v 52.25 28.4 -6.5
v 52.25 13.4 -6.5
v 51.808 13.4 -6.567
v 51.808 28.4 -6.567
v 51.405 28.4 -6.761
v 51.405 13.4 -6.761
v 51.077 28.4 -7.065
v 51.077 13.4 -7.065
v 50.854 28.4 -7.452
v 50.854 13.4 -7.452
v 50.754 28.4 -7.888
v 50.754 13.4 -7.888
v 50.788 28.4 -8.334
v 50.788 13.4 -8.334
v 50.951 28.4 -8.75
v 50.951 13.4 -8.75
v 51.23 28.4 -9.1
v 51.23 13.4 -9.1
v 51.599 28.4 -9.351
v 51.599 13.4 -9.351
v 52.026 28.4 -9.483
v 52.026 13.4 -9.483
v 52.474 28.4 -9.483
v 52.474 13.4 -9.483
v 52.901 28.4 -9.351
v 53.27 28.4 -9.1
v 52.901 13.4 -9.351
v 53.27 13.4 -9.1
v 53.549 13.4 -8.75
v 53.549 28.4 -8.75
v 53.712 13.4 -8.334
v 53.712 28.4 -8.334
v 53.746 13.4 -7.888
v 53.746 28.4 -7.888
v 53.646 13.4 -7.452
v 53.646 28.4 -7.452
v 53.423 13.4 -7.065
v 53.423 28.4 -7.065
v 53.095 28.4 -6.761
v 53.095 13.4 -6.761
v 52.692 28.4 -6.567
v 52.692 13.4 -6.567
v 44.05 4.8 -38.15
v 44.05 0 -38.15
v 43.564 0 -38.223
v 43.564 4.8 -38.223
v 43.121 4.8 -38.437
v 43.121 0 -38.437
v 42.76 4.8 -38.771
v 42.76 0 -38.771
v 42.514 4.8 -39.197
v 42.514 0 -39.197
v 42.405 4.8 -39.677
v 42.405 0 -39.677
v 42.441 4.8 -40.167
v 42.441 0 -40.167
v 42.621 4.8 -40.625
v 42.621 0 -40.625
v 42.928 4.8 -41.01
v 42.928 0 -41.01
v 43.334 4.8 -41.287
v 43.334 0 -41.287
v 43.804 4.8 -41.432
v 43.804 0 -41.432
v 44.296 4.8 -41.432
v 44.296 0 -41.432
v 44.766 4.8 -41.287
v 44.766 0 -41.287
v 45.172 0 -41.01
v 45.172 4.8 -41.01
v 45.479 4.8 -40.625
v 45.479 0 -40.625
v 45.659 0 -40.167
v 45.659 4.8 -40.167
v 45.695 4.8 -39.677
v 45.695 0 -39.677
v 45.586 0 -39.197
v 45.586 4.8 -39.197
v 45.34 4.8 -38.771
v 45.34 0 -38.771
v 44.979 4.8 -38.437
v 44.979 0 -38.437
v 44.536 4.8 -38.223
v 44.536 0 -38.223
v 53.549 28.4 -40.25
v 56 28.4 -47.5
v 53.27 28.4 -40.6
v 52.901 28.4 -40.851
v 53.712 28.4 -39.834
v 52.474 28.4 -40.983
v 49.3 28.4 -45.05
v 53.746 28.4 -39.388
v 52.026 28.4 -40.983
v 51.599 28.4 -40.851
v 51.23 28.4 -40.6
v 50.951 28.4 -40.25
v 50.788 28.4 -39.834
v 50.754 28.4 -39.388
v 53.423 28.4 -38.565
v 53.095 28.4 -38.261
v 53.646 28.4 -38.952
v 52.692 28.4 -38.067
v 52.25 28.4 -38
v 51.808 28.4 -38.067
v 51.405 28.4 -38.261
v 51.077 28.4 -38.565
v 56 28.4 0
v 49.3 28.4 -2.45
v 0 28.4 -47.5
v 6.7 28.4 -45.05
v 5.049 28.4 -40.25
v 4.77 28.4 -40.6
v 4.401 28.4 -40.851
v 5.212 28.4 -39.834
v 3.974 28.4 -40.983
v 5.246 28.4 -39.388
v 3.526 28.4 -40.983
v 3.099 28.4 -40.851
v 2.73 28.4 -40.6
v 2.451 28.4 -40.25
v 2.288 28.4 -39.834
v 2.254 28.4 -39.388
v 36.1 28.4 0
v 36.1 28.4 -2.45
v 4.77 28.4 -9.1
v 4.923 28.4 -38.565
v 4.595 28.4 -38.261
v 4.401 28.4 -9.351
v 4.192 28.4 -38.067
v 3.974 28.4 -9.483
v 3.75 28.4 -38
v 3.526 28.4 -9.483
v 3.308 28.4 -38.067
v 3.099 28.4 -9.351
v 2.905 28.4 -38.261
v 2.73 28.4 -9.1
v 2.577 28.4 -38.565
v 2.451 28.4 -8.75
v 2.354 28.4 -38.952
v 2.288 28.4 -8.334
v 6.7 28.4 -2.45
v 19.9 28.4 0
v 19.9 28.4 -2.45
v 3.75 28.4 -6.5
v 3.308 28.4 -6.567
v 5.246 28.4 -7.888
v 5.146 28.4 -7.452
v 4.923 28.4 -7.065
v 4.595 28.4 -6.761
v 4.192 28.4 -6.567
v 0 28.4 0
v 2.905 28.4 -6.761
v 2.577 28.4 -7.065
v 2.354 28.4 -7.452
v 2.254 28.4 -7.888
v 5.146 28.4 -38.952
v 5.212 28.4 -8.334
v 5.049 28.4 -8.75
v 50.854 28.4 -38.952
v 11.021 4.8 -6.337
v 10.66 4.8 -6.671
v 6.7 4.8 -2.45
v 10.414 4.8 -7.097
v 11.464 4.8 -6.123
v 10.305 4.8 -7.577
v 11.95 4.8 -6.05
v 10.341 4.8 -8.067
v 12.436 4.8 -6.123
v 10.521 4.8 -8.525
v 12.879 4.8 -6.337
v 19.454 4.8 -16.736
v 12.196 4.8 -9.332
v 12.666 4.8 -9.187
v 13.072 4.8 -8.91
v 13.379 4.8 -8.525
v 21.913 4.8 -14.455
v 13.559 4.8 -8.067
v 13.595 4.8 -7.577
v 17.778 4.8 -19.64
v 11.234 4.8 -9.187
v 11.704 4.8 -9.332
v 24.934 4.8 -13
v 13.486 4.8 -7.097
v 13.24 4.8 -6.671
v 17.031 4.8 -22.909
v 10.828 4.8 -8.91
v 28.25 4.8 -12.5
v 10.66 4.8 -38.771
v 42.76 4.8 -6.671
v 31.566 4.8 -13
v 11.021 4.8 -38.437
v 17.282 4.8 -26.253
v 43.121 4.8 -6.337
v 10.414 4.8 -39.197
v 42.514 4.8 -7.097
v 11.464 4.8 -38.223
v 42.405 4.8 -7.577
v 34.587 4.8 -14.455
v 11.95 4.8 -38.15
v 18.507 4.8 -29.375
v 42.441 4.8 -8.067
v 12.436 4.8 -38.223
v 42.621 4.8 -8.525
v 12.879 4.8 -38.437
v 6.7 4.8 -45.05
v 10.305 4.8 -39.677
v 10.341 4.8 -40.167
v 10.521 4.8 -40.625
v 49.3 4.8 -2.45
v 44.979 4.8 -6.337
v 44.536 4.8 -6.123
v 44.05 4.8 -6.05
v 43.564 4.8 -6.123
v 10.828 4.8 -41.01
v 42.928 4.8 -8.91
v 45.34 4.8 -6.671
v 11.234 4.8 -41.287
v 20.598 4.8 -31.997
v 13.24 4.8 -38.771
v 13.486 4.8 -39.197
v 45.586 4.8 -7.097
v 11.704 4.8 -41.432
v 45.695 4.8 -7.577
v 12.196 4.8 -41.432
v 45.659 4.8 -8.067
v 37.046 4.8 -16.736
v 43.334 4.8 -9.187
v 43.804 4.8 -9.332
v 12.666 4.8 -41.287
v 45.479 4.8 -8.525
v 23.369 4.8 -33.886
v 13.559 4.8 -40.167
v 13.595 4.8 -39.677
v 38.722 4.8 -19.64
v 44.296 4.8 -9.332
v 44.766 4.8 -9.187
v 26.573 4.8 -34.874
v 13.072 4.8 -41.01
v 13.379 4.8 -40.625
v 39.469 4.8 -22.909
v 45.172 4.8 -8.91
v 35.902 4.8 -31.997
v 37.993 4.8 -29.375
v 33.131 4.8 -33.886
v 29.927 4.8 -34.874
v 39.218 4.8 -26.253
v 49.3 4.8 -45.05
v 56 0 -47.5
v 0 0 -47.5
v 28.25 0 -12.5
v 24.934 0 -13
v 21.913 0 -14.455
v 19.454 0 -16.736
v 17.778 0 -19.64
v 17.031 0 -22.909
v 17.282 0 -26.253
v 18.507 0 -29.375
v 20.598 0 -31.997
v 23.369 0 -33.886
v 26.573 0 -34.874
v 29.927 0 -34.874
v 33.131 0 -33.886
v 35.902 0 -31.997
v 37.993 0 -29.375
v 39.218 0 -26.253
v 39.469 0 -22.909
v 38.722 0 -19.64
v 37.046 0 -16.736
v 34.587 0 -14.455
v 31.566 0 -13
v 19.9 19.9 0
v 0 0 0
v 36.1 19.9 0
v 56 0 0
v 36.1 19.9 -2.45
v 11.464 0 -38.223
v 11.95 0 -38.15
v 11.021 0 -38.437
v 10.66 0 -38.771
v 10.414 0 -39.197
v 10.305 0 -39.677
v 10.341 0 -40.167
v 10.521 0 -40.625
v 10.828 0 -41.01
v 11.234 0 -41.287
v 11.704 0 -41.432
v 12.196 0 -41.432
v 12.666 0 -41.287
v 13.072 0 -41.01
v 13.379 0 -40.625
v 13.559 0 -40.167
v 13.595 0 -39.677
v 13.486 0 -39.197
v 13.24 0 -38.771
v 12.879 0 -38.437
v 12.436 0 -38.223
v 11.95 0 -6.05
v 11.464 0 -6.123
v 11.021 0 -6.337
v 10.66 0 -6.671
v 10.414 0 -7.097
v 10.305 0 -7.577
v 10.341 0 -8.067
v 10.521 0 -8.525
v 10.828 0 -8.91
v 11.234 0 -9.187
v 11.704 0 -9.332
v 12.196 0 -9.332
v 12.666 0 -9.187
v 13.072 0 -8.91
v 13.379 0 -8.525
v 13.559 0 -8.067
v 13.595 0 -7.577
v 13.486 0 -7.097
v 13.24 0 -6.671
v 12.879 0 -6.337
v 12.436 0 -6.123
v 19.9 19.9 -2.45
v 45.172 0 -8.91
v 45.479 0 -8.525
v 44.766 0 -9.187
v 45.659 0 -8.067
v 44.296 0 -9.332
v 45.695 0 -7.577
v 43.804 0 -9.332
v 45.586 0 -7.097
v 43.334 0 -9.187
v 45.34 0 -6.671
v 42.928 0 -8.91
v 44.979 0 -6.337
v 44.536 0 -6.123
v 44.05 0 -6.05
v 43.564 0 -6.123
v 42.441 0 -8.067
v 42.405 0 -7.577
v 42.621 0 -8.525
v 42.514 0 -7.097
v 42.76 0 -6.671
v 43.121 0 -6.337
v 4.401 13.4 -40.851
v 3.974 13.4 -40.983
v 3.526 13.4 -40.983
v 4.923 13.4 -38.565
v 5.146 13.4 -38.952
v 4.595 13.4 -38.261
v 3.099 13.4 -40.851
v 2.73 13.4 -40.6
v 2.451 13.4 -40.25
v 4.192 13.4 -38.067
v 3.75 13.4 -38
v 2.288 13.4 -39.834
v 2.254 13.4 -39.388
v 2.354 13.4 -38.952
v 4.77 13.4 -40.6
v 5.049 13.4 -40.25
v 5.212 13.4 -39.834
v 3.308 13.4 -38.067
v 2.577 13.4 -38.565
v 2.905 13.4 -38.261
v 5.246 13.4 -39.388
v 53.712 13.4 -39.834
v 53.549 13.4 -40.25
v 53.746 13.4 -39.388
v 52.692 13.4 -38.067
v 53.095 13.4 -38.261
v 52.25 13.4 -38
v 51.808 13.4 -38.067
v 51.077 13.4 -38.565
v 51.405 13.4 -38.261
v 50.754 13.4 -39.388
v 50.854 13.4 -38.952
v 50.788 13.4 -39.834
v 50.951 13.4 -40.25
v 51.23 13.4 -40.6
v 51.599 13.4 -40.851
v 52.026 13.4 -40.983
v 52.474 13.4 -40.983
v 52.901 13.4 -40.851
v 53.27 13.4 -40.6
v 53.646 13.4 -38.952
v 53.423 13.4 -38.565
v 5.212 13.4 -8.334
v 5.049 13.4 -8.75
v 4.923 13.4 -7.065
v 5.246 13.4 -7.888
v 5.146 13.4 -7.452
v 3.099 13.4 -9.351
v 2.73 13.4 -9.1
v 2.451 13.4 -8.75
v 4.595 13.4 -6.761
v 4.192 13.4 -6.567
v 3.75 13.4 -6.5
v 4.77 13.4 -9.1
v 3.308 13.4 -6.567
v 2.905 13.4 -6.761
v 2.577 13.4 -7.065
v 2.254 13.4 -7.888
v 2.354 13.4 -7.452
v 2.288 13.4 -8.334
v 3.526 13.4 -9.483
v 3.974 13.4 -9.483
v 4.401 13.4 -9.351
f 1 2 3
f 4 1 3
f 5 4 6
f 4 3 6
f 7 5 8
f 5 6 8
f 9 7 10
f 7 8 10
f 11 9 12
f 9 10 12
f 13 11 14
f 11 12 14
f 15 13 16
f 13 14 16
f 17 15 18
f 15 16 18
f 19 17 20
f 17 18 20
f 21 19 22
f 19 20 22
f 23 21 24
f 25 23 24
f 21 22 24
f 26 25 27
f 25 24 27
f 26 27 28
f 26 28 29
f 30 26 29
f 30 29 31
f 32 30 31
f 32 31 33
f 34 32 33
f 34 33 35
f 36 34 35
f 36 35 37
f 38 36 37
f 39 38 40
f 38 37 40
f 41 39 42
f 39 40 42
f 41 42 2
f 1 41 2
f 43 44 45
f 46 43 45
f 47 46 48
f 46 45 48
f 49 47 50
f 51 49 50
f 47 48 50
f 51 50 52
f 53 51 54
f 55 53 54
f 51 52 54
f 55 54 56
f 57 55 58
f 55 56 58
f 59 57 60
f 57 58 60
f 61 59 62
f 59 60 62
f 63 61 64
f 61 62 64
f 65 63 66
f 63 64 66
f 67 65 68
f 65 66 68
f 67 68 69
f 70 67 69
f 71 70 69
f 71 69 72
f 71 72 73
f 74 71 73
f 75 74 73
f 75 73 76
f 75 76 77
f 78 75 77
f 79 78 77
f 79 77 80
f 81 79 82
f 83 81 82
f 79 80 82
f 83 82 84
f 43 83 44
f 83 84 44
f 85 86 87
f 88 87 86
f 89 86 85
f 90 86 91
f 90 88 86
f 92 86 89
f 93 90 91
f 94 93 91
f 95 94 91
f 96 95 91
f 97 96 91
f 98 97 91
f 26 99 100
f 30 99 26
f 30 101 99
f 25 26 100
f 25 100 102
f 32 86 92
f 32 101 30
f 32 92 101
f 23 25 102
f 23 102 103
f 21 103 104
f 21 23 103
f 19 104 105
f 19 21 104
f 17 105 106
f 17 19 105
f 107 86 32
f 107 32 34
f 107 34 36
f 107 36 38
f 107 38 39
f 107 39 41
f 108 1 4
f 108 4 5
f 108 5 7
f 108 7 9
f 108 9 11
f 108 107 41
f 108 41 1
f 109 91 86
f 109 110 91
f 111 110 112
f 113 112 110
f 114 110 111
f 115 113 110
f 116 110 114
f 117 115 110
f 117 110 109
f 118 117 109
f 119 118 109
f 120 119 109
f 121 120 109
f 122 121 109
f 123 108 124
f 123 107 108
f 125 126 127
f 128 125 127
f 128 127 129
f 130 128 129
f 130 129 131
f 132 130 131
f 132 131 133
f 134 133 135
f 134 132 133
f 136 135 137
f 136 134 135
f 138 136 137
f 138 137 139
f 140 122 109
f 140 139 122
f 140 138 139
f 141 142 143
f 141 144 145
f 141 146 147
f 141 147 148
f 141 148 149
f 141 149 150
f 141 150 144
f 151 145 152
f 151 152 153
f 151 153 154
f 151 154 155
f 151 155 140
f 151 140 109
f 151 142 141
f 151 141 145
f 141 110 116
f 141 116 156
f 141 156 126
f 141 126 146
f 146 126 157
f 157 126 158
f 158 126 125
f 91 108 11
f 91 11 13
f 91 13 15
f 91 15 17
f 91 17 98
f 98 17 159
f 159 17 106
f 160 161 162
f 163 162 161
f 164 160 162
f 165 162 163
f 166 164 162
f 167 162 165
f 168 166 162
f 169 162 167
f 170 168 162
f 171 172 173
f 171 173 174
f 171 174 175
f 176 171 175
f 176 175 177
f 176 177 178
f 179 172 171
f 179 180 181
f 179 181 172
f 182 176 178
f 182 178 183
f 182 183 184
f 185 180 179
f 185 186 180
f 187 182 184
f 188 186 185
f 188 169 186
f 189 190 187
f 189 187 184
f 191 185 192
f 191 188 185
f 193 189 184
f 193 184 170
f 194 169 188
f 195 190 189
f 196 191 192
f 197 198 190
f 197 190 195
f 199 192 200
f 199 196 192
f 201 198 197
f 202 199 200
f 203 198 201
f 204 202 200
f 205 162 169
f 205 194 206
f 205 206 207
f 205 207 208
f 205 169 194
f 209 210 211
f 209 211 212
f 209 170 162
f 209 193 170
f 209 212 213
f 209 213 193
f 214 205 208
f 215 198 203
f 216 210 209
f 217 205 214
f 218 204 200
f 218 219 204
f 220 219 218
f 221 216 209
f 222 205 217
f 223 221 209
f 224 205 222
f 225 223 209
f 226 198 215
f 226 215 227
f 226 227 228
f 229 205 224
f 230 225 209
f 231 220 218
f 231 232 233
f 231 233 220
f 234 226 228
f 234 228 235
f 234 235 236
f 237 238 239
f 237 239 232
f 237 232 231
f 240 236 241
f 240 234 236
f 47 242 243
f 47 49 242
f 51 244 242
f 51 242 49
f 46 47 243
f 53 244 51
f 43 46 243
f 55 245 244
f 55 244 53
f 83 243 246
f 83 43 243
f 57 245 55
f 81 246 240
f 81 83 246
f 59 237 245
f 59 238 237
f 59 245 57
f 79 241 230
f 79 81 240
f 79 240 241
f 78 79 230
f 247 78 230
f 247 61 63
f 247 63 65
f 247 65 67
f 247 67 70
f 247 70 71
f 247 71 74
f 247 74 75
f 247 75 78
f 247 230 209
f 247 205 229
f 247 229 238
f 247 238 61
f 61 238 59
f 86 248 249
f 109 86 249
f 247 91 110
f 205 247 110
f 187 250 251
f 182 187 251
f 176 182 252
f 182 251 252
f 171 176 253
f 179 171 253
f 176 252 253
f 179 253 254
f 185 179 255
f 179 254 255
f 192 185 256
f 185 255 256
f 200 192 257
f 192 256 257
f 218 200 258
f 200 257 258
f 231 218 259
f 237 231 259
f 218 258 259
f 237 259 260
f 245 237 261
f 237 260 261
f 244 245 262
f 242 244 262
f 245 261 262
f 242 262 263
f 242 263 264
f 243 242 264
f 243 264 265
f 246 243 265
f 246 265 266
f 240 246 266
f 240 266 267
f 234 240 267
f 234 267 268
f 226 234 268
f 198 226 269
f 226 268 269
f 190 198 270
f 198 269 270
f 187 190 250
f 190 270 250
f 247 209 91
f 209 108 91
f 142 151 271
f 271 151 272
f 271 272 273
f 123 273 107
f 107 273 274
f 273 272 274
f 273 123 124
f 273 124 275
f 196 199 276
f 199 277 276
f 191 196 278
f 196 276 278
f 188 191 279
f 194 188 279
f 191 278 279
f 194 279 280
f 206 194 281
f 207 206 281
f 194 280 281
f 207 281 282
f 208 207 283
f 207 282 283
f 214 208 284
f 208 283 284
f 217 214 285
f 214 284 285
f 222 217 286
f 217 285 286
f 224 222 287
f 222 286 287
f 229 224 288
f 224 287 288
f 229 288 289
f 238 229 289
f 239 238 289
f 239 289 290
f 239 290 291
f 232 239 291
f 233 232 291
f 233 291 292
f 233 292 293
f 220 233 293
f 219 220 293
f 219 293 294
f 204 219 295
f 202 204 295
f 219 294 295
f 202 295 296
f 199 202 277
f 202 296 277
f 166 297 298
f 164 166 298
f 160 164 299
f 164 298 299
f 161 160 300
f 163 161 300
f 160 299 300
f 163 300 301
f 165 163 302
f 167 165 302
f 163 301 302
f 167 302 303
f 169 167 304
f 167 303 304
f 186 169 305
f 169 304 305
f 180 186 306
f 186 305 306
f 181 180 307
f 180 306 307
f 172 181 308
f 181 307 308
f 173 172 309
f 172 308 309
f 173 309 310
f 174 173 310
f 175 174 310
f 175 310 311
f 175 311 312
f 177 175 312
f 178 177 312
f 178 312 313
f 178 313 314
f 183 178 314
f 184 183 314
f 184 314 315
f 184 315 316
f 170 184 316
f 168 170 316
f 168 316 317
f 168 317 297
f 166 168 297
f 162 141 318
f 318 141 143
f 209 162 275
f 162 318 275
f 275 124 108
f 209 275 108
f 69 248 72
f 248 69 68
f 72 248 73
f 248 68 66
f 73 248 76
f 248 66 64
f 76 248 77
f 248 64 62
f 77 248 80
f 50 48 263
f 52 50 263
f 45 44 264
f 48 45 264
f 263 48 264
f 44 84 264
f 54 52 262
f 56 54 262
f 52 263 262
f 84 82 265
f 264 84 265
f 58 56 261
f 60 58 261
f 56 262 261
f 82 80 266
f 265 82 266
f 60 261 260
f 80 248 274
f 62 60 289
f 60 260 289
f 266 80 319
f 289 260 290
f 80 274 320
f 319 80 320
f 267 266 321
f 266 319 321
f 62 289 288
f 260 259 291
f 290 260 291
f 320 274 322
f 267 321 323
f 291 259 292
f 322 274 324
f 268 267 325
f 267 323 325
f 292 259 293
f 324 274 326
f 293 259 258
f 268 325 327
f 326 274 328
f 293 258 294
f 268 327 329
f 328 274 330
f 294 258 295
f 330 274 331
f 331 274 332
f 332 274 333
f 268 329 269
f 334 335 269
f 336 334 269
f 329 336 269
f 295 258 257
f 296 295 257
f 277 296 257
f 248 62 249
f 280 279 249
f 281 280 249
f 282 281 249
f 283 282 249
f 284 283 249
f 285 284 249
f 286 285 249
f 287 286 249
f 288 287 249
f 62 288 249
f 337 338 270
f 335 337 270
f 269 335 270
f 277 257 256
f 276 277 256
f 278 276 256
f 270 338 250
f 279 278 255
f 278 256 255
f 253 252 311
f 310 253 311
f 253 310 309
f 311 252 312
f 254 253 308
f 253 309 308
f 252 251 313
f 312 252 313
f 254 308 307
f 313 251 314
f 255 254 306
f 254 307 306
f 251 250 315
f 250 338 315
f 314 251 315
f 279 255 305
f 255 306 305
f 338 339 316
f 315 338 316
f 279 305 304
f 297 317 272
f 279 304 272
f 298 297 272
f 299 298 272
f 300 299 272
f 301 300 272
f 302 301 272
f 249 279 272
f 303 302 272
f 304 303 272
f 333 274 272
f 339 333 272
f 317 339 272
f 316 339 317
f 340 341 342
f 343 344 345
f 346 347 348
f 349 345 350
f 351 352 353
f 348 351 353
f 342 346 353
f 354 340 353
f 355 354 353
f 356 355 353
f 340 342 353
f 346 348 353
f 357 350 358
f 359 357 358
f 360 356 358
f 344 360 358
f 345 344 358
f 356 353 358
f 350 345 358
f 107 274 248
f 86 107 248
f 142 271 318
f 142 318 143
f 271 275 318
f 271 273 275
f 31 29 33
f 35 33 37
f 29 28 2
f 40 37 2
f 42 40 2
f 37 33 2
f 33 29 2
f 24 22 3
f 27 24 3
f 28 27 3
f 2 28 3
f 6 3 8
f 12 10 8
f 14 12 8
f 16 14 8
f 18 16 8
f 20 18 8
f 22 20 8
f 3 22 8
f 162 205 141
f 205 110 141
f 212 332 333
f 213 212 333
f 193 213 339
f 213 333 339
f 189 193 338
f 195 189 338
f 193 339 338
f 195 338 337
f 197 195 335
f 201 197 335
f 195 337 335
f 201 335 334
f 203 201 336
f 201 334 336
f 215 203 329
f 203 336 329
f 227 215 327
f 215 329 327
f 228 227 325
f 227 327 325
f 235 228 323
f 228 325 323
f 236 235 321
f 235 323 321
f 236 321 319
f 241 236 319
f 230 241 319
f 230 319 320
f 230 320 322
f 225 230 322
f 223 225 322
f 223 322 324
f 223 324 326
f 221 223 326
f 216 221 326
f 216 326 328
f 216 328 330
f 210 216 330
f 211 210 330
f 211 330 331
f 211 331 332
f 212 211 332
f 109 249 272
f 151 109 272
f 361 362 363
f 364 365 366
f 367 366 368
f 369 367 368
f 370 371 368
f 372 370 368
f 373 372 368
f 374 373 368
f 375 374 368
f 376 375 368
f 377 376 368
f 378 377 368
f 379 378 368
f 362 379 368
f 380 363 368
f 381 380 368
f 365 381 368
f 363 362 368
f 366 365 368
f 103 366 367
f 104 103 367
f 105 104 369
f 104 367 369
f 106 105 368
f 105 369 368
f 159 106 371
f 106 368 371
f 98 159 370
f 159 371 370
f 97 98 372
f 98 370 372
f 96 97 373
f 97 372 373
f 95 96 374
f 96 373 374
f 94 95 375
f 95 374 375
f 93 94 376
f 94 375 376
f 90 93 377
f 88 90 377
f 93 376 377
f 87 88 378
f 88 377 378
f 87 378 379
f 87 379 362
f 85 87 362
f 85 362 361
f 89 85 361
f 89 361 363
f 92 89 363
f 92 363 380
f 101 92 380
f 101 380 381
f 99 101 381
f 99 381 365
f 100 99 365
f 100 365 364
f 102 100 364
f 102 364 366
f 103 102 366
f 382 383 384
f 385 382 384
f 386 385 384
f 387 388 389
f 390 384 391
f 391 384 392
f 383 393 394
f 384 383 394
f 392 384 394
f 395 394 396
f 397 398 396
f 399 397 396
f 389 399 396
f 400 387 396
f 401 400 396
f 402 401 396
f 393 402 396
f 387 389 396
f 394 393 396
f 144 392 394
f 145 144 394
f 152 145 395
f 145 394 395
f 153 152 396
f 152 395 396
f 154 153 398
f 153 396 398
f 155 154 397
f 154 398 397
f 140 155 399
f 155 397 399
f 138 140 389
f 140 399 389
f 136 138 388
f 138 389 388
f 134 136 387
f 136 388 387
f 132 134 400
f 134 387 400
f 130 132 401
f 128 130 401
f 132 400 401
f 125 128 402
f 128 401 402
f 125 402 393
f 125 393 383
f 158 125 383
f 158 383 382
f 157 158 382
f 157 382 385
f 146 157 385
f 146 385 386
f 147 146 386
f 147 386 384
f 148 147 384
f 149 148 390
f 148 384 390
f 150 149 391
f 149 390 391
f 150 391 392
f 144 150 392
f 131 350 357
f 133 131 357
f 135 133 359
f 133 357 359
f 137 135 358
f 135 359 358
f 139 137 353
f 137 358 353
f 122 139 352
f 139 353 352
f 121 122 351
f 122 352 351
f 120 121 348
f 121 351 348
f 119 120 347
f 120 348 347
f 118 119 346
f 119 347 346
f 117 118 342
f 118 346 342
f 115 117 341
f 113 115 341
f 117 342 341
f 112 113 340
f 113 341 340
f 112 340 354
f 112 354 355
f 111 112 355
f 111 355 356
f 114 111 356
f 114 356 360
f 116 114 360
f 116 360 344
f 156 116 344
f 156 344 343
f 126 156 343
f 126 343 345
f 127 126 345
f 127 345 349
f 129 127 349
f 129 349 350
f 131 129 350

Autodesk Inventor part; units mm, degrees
ref_plane "YZ Plane" through (0, 0, 0) normal (1, 0, 0) x (0, 1, 0)
ref_plane "XZ Plane" through (0, 0, 0) normal (0, 1, 0) x (-1, 0, 0)
ref_plane "XY Plane" through (0, 0, 0) normal (0, 0, 1) x (1, 0, 0)
sketch "スケッチ1" plane through (0, 0, 0) normal (0, 1, 0) x (-1, 0, 0)
  line L0 (0, 0) -> (-56, 0)
  line L1 (-56, 0) -> (-56, -47.5)
  line L2 (-56, -47.5) -> (0, -47.5)
  line L3 (0, -47.5) -> (0, 0)
  line L4 (-7.5, -3) -> (-49, -3)
  line L5 (-49, -3) -> (-49, -44.5)
  line L6 (-49, -44.5) -> (-7.5, -44.5)
  line L7 (-7.5, -44.5) -> (-7.5, -3)
  dimension "d0" = 56
  dimension "d1" = 47.5
  dimension "d6" = 41.5
  dimension "d7" = 41.5
extrude "押し出し1" add sketch "スケッチ1" along normal blind 28.4 contours L3 L2 L1 L0 | L7 L6 L5 L4
ref_plane "作業平面2" through (0, 28.4, 0) normal (0, 1, 0) x (1, 0, 0)
sketch "スケッチ3" plane through (0, 28.4, 0) normal (0, 1, 0) x (1, 0, 0)
  line L0 (6.7, 2.45) -> (49.3, 2.45)
  line L1 (49.3, 2.45) -> (49.3, 45.05)
  line L2 (49.3, 45.05) -> (6.7, 45.05)
  line L3 (6.7, 45.05) -> (6.7, 2.45)
  line L4 (56, 47.5) -> (0, 47.5) projected
  line L5 (0, 0) -> (56, 0) projected
  line L6 (56, 0) -> (56, 47.5) projected
  point P0 (28, 45.05)
  point P1 (28, 47.5)
  point P2 (28, 0)
  point P3 (49.3, 23.75)
  point P4 (56, 23.75)
  point P5 (56, 23.75)
  dimension "d8" = 42.6
  dimension "d9" = 42.6
  dimension "d61" = 0
  dimension "d62" = 0
extrude "押し出し2" cut sketch "スケッチ3" against normal blind 23.6
sketch "スケッチ4" plane through (0, 4.8, 0) normal (0, 1, 0) x (1, 0, 0)
  line L0 (6.7, 2.45) -> (6.7, 45.05) projected
  line L1 (49.3, 45.05) -> (49.3, 2.45) projected
  line L2 (6.7, 45.05) -> (49.3, 45.05) projected
  point P0 (0, 0)
  point P1 (28.25, 23.75)
hole "穴1" at (28.25, 4.8, -23.75) direction (0, -1, 0) diameter 22.5 end through all
sketch "スケッチ5" plane through (0, 4.8, 0) normal (0, 1, 0) x (1, 0, 0)
  line L0 (6.7, 45.05) -> (49.3, 45.05) projected
  line L1 (6.7, 2.45) -> (6.7, 45.05) projected
  line L2 (49.3, 45.05) -> (49.3, 2.45) projected
  line L3 (49.3, 2.45) -> (6.7, 2.45) projected
  point P0 (0, 0)
  point P1 (11.95, 39.8)
  point P2 (44.05, 39.8)
  point P3 (44.05, 7.7)
  point P4 (11.95, 7.7)
  dimension "d23" = 5.25
  dimension "d24" = 5.25
  dimension "d25" = 5.25
  dimension "d26" = 5.25
  dimension "d27" = 5.25
  dimension "d28" = 5.25
  dimension "d29" = 5.25
  dimension "d30" = 5.25
hole "穴2" at (11.95, 4.8, -39.8) at (44.05, 4.8, -39.8) at (44.05, 4.8, -7.7) at (11.95, 4.8, -7.7) direction (0, -1, 0) diameter 3.3 end through all
sketch "スケッチ6" plane through (0, 28.4, 0) normal (0, 1, 0) x (1, 0, 0)
  line L0 (0, 47.5) -> (0, 0) projected
  line L1 (49.3, 45.05) -> (49.3, 2.45) projected
  line L2 (56, 47.5) -> (0, 47.5) projected
  line L3 (0, 0) -> (56, 0) projected
  line L4 (56, 0) -> (56, 47.5) projected
  line L5 (6.7, 2.45) -> (6.7, 45.05) projected
  point P0 (3.75, 39.5)
  point P1 (3.75, 8)
  point P2 (52.25, 8)
  point P3 (52.25, 39.5)
  dimension "d38" = 3.75
  dimension "d40" = 8
  dimension "d41" = 8
  dimension "d42" = 3.75
  dimension "d43" = 3.75
  dimension "d44" = 8
  dimension "d45" = 8
  dimension "d46" = 3.75
  dimension "d64" = 2.95
hole "穴3" at (3.75, 28.4, -39.5) at (3.75, 28.4, -8) at (52.25, 28.4, -8) at (52.25, 28.4, -39.5) direction (0, -1, 0) diameter 3 depth 15
sketch "スケッチ7" plane through (0, 0, 0) normal (0, 0, 1) x (1, 0, 0)
  line L0 (56, 28.4) -> (0, 28.4) projected
  line L1 (19.9, 28.4) -> (36.1, 28.4)
  line L2 (36.1, 28.4) -> (36.1, 19.9)
  line L3 (36.1, 19.9) -> (19.9, 19.9)
  line L4 (19.9, 19.9) -> (19.9, 28.4)
  line L5 (0, 0) -> (56, 0) projected
  point P0 (28, 19.9)
  point P1 (28, 0)
  dimension "d55" = 16.2
  dimension "d63" = 0
extrude "押し出し3" cut sketch "スケッチ7" against normal blind 3
properties part number "motor_case2_3D プリント"
